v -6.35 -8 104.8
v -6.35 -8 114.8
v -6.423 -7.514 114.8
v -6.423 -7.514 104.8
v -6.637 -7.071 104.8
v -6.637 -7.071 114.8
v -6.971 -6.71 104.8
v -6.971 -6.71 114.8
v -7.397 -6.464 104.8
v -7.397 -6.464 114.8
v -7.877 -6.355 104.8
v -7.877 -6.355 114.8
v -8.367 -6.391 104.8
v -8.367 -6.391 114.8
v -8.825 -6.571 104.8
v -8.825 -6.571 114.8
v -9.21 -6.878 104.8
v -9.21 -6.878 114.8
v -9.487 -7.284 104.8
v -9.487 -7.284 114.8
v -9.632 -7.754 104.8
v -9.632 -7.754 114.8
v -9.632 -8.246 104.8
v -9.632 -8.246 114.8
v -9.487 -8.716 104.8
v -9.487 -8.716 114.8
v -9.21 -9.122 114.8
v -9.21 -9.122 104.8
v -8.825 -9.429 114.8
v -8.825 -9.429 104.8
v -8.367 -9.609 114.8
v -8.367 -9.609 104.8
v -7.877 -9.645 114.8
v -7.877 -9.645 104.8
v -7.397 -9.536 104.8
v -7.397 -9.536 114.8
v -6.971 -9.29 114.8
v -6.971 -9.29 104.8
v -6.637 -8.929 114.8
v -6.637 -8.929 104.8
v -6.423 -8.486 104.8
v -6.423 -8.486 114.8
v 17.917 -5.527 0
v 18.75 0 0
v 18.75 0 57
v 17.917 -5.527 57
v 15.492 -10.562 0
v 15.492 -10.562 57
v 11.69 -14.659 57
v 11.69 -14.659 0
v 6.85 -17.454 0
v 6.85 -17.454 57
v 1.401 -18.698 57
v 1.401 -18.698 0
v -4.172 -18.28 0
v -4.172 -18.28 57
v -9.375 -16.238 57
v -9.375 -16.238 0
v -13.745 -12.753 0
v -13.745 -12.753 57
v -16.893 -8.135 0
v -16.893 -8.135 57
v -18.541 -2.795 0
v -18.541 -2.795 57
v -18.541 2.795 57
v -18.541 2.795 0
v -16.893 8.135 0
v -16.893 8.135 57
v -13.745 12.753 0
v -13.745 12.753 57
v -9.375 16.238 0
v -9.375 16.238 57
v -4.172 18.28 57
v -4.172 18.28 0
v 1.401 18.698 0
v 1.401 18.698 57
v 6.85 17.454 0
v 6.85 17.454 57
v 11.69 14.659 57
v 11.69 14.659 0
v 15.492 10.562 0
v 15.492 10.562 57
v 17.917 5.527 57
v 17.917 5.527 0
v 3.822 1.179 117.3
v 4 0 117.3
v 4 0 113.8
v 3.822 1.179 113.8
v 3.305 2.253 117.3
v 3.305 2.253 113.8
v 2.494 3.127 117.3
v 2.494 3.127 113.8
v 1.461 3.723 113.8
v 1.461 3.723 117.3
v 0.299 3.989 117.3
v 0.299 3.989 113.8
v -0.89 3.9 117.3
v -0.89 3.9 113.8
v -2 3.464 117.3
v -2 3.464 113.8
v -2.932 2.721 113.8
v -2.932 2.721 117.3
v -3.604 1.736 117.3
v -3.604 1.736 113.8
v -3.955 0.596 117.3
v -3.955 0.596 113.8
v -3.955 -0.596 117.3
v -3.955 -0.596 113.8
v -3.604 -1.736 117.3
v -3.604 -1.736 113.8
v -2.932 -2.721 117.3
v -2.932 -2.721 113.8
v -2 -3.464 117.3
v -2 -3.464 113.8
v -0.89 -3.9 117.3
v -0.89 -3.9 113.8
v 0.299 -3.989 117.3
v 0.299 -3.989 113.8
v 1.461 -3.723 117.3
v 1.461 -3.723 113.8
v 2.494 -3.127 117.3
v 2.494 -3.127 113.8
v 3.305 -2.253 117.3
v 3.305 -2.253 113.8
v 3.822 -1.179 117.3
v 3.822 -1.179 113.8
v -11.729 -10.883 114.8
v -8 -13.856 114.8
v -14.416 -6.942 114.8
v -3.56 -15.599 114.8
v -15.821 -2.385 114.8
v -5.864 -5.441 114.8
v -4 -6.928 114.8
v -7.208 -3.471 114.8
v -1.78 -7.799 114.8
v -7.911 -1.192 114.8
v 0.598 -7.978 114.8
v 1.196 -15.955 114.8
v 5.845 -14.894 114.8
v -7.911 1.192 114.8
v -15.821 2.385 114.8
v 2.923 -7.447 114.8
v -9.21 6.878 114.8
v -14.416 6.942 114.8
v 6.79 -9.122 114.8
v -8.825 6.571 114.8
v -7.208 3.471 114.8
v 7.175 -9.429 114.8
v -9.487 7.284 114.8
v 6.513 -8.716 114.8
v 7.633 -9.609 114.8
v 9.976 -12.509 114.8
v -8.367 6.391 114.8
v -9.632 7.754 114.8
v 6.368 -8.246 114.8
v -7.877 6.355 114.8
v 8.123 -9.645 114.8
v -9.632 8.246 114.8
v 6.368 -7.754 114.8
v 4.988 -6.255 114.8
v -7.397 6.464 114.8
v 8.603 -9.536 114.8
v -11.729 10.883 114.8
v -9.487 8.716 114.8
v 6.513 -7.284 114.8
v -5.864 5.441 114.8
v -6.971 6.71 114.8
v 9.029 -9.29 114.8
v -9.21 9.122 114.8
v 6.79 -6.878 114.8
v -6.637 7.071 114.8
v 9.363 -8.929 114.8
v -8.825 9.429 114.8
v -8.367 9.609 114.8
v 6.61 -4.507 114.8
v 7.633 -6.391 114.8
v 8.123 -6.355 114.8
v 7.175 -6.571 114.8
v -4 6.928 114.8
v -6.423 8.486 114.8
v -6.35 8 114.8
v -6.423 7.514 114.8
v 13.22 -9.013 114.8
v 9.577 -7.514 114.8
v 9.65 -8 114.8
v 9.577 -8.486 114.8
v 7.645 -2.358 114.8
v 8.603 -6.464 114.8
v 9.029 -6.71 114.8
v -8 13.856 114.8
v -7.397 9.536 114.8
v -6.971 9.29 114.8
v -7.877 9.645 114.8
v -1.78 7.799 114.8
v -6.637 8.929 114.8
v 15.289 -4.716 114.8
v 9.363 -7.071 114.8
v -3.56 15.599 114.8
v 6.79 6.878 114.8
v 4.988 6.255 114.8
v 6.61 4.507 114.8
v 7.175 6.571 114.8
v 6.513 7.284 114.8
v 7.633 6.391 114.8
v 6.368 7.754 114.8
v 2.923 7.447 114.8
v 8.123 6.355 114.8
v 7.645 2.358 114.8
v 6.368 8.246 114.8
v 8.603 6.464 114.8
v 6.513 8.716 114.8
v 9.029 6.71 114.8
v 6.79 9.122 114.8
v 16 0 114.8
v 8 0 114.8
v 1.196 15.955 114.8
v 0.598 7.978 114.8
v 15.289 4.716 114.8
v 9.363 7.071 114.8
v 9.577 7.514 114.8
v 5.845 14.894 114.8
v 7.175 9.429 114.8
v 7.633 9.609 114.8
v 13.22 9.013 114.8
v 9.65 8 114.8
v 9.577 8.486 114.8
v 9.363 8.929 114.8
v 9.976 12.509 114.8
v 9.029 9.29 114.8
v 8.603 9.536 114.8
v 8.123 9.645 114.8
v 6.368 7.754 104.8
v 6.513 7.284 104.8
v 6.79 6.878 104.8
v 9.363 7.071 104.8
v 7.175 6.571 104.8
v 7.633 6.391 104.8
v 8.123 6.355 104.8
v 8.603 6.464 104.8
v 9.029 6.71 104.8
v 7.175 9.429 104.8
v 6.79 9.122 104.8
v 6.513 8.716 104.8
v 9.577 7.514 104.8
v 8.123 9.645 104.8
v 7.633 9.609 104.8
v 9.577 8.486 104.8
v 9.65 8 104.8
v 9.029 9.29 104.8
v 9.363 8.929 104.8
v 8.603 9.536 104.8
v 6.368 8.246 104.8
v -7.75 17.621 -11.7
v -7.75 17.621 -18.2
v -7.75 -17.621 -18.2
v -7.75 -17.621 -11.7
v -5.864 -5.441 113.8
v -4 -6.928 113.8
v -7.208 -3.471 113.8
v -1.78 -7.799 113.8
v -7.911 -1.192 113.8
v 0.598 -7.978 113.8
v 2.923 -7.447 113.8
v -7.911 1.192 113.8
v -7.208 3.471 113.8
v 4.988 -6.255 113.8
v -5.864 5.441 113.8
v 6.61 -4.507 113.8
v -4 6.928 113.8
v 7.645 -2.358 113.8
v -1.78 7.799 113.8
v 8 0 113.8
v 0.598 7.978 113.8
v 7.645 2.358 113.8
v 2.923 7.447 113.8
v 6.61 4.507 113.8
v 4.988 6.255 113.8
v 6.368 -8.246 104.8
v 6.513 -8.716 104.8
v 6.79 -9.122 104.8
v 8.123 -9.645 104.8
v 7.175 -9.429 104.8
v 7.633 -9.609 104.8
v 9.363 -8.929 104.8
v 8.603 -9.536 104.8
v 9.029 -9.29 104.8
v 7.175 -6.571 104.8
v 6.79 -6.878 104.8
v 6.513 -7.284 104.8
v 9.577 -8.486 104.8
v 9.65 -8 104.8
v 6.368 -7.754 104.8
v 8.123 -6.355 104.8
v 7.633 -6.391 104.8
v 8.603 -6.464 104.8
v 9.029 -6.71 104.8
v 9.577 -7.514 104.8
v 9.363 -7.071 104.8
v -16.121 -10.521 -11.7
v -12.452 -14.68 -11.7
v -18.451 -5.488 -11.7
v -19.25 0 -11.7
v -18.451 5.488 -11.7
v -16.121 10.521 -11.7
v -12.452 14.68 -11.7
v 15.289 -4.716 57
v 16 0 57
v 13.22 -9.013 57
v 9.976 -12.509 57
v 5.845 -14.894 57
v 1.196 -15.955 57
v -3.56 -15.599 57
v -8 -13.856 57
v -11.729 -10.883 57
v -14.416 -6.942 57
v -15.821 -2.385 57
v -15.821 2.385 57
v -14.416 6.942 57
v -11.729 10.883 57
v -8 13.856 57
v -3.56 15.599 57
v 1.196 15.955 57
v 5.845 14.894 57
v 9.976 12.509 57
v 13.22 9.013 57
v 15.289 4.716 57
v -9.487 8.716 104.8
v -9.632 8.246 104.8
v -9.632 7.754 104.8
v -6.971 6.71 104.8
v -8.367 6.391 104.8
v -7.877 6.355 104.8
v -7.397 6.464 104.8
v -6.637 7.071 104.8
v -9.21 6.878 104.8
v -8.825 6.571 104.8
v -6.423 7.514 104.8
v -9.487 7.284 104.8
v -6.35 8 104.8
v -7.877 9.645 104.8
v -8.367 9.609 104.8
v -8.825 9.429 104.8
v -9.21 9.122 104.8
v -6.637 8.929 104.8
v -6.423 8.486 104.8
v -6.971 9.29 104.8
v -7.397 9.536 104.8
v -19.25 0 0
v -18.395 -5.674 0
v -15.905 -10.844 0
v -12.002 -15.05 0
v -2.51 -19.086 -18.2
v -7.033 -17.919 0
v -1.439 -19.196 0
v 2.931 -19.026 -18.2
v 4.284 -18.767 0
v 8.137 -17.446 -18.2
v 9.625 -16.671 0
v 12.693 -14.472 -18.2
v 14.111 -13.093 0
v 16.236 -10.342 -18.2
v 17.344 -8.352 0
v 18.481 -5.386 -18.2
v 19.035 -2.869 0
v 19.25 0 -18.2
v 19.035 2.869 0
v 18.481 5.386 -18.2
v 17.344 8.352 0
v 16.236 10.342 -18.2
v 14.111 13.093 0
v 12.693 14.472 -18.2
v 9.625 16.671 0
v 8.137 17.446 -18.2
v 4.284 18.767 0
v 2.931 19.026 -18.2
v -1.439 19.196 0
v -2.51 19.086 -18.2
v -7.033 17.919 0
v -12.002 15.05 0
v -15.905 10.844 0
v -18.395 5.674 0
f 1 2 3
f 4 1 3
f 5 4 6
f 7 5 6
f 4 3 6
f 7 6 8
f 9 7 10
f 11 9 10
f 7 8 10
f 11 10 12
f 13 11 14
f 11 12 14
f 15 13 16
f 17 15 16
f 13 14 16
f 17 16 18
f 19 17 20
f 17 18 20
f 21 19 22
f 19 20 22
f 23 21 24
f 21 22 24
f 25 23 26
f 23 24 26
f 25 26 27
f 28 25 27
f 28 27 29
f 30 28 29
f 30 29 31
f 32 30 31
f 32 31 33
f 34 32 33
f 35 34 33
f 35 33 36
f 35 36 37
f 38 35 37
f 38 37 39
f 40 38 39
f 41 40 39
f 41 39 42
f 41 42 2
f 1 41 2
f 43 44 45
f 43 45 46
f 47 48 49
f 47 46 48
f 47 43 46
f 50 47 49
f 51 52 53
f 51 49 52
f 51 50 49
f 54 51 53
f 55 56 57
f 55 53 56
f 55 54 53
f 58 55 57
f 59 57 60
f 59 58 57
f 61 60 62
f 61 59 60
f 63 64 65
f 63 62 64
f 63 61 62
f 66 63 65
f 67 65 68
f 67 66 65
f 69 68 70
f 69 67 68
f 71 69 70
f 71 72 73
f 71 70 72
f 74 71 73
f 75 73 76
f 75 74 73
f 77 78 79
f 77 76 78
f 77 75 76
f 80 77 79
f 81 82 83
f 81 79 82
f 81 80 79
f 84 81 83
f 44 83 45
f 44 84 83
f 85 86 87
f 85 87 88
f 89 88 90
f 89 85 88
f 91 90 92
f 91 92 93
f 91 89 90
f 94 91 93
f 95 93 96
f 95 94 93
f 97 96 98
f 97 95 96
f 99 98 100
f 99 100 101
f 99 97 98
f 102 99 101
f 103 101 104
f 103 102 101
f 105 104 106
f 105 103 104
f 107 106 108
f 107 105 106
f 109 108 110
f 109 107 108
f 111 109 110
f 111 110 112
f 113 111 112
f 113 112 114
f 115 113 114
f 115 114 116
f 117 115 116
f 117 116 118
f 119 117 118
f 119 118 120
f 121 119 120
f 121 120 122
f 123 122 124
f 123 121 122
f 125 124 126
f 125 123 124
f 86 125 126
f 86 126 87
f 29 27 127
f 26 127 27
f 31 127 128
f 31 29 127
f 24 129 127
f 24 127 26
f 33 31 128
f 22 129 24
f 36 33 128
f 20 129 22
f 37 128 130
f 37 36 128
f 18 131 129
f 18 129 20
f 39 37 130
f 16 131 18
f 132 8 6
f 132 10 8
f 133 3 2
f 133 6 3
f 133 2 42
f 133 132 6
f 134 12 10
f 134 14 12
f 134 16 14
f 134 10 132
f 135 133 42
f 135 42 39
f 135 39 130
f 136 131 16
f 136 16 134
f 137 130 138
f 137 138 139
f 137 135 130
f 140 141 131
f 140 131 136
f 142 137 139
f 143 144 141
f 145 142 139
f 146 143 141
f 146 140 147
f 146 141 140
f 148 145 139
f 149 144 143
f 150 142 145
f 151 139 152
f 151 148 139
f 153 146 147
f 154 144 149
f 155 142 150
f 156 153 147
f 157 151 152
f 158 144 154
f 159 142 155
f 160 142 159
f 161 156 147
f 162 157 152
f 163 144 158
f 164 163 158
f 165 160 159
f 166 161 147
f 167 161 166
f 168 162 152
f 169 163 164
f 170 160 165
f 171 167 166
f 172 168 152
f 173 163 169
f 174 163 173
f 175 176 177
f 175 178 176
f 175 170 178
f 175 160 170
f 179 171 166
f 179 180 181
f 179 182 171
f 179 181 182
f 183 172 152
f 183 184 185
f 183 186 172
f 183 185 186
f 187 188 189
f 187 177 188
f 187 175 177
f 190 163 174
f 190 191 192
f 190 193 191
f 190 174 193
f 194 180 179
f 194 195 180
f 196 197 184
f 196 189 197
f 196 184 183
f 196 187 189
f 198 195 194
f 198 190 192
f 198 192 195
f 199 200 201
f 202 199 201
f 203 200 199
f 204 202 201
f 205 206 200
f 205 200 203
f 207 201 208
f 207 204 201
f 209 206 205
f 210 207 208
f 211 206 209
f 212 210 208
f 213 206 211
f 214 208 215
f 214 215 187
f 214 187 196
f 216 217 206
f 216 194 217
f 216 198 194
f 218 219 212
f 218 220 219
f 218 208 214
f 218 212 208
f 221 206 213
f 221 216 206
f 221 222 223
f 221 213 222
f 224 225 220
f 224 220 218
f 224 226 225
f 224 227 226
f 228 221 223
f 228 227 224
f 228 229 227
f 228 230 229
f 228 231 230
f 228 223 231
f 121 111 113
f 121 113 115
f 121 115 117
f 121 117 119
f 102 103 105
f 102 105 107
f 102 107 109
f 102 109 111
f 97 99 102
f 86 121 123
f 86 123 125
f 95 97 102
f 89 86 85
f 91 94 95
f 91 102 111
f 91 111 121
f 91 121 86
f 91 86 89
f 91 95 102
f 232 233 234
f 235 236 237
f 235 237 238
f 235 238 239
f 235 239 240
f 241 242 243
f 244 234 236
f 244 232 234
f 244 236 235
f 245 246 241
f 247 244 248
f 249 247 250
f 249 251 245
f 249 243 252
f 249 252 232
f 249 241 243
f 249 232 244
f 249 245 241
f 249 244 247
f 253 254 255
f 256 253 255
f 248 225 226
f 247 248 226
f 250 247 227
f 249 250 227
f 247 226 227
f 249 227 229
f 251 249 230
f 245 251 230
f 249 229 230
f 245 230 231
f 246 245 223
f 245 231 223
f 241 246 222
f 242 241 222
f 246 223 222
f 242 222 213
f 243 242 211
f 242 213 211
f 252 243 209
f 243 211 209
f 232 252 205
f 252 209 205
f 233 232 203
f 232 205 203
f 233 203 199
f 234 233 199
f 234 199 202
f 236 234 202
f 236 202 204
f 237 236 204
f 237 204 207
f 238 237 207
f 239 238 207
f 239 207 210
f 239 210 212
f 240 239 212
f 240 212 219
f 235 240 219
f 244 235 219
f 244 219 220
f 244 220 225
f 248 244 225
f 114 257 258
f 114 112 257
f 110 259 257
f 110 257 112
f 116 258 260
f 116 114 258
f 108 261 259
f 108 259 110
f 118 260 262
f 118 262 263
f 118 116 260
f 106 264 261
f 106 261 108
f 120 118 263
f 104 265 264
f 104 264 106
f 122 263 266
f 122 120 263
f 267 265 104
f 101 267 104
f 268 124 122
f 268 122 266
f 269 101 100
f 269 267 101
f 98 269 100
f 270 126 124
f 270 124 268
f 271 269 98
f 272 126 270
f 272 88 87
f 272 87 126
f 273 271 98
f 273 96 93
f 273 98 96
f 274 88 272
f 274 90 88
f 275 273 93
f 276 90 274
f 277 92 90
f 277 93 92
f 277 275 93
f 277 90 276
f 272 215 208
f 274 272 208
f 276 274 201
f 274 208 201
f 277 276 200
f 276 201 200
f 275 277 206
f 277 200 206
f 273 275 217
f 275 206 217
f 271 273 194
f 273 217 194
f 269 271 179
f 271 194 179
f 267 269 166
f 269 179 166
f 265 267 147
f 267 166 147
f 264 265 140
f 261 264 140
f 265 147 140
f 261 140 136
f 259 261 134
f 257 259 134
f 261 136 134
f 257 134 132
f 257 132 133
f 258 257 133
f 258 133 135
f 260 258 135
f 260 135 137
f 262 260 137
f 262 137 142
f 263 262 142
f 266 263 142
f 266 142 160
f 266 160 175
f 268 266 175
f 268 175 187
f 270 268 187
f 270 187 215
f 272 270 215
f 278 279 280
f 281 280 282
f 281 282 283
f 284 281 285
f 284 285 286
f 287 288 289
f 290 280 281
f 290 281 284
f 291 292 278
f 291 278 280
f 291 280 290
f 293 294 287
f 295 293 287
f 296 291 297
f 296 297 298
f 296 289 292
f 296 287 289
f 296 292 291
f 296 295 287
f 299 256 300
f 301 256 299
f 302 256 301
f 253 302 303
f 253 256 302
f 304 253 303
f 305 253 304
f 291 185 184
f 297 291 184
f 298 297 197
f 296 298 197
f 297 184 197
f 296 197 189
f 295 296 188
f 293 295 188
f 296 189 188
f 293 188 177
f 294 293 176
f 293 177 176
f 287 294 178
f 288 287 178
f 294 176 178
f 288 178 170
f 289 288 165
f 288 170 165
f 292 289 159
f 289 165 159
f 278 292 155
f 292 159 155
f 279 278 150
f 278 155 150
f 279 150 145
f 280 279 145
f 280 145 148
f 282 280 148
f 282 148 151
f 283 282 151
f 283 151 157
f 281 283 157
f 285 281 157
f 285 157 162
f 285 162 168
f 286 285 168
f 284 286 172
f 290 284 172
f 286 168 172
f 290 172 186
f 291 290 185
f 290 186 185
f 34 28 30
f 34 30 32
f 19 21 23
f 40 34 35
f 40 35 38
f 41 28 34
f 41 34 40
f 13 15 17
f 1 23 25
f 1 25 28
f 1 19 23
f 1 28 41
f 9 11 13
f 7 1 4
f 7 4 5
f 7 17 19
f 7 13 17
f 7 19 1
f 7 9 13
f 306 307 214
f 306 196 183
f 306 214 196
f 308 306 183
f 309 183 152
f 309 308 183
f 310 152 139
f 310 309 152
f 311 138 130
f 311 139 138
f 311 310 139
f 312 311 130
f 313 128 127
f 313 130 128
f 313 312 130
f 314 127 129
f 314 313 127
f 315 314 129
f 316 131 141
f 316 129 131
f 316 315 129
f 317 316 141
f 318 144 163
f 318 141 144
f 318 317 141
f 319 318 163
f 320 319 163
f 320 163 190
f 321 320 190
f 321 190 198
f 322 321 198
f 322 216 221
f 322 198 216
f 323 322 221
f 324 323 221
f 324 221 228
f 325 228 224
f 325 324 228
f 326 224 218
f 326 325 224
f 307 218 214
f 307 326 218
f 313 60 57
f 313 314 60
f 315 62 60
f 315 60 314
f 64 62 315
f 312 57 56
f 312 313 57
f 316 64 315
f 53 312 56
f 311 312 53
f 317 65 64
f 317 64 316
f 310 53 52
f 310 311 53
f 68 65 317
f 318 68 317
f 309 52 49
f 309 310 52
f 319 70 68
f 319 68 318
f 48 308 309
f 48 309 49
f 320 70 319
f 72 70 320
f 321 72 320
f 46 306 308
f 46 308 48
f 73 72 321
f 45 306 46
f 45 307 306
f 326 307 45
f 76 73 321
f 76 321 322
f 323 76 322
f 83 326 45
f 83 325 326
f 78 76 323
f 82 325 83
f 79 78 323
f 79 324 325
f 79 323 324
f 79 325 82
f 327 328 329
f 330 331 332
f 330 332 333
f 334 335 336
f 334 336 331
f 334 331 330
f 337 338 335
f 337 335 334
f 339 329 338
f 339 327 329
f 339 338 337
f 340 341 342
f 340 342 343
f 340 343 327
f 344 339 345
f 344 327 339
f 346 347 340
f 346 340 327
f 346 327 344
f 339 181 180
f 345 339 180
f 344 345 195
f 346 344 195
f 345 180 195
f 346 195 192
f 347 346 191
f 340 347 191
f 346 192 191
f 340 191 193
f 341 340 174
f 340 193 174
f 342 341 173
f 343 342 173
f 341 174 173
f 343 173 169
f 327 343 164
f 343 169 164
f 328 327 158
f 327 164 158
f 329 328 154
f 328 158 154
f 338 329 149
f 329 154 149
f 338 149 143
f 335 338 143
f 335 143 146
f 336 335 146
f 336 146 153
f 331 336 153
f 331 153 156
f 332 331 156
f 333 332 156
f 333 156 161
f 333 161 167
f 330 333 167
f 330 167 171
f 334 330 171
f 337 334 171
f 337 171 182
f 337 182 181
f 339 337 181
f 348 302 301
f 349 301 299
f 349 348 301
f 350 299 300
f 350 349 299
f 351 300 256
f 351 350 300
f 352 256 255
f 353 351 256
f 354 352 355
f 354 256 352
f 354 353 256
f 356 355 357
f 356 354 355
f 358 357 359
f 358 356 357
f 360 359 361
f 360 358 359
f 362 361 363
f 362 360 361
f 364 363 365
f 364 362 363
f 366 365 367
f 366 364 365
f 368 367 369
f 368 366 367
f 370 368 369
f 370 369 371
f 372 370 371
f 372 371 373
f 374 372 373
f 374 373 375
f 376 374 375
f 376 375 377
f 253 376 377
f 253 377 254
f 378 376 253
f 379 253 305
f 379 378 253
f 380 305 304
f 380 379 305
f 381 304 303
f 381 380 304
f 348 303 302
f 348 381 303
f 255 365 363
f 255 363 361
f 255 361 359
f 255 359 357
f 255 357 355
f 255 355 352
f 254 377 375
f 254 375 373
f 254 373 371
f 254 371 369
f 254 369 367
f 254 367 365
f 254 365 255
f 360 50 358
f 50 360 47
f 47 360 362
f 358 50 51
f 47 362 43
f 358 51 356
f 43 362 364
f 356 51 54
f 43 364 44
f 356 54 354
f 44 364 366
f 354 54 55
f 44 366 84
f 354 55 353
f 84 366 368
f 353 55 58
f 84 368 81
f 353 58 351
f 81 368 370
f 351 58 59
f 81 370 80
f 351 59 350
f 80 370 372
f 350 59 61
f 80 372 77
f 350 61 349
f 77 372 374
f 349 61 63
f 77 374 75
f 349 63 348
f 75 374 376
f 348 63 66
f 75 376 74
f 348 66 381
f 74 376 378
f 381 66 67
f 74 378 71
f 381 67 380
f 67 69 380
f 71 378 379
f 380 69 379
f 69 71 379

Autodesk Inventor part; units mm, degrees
ref_plane "YZ Plane" through (0, 0, 0) normal (1, 0, 0) x (0, 1, 0)
ref_plane "XZ Plane" through (0, 0, 0) normal (0, 1, 0) x (-1, 0, 0)
ref_plane "XY Plane" through (0, 0, 0) normal (0, 0, 1) x (1, 0, 0)
sketch "Base" plane through (0, 0, 0) normal (0, 0, 1) x (1, 0, 0)
  circle A0 centre (0, 0) radius 18.75
  dimension "d0" = 37.5
extrude "BaseFeature" add sketch "Base" along normal blind 57
sketch "Sketch2" plane through (0, 0, 0) normal (0, 0, -1) x (-1, 0, 0)
  circle A0 centre (0, 0) radius 18.75 projected
  circle A1 centre (0, 0) radius 19.25
  dimension "d3" = 0.5
extrude "BottomFeature" add sketch "Sketch2" along normal blind 18.2 contours A0 | A1
sketch "Panel" plane through (0, 0, -18.2) normal (0, 0, -1) x (-1, 0, 0)
  circle A0 centre (0, 0) radius 19.25 projected
  line L0 (7.75, 17.621) -> (7.75, -17.621)
  circle A1 centre (0, 0) radius 18.75 construction
  line L1 (0, 0) -> (-19.25, 0) construction
  circle A2 centre (0, 0) radius 19.25 projected
  line L2 (7.75, 17.621) -> (19.25, 17.621)
  line L3 (19.25, 17.621) -> (19.25, -17.621)
  line L4 (19.25, -17.621) -> (7.75, -17.621)
  line L5 (7.75, -17.621) -> (7.75, 17.621)
  dimension "d6" = 27
extrude "PanelFeature" cut sketch "Panel" against normal blind 6.5 contours A0 L0 picked at (11.5833, 0)
sketch "Gearbox" plane through (0, 0, 57) normal (0, 0, 1) x (1, 0, 0)
  circle A0 centre (0, 0) radius 16
  dimension "d9" = 32
extrude "GearboxFeature" add sketch "Gearbox" along normal blind 57.8
sketch "Shaft" plane through (0, 0, 114.8) normal (0, 0, 1) x (1, 0, 0)
  circle A0 centre (0, 0) radius 18.75 projected
  circle A1 centre (0, 0) radius 8
  dimension "d12" = 16
extrude "ShaftFeature" cut sketch "Shaft" against normal blind 1 contours A1
sketch "MountHoles" plane through (0, 0, 114.8) normal (0, 0, 1) x (1, 0, 0)
  line L0 (0, 0) -> (-19.25, 0) construction
  line L1 (0, 0) -> (0, 19.25) construction
  circle A0 centre (0, 0) radius 19.25 construction
  line L2 (-8, -8) -> (8, -8) construction
  line L3 (8, -8) -> (8, 8) construction
  line L4 (8, 8) -> (-8, 8) construction
  line L5 (-8, 8) -> (-8, -8) construction
  circle A1 centre (-8, -8) radius 1.65
  circle A2 centre (-8, 8) radius 1.65
  circle A3 centre (8, 8) radius 1.65
  circle A4 centre (8, -8) radius 1.65
  point P0 (-8, 0)
  point P1 (0, 8)
  dimension "d16" = 16
  dimension "d17" = 3.3
extrude "MountHolesFeature" cut sketch "MountHoles" against normal blind 10
sketch "ShaftBase" plane through (0, 0, 114.8) normal (0, 0, 1) x (1, 0, 0)
  circle A0 centre (0, 0) radius 4
  dimension "d22" = 8
extrude "ShaftBaseFeature" add sketch "ShaftBase" along normal mid plane 5
properties part number "ShoulderServo"
